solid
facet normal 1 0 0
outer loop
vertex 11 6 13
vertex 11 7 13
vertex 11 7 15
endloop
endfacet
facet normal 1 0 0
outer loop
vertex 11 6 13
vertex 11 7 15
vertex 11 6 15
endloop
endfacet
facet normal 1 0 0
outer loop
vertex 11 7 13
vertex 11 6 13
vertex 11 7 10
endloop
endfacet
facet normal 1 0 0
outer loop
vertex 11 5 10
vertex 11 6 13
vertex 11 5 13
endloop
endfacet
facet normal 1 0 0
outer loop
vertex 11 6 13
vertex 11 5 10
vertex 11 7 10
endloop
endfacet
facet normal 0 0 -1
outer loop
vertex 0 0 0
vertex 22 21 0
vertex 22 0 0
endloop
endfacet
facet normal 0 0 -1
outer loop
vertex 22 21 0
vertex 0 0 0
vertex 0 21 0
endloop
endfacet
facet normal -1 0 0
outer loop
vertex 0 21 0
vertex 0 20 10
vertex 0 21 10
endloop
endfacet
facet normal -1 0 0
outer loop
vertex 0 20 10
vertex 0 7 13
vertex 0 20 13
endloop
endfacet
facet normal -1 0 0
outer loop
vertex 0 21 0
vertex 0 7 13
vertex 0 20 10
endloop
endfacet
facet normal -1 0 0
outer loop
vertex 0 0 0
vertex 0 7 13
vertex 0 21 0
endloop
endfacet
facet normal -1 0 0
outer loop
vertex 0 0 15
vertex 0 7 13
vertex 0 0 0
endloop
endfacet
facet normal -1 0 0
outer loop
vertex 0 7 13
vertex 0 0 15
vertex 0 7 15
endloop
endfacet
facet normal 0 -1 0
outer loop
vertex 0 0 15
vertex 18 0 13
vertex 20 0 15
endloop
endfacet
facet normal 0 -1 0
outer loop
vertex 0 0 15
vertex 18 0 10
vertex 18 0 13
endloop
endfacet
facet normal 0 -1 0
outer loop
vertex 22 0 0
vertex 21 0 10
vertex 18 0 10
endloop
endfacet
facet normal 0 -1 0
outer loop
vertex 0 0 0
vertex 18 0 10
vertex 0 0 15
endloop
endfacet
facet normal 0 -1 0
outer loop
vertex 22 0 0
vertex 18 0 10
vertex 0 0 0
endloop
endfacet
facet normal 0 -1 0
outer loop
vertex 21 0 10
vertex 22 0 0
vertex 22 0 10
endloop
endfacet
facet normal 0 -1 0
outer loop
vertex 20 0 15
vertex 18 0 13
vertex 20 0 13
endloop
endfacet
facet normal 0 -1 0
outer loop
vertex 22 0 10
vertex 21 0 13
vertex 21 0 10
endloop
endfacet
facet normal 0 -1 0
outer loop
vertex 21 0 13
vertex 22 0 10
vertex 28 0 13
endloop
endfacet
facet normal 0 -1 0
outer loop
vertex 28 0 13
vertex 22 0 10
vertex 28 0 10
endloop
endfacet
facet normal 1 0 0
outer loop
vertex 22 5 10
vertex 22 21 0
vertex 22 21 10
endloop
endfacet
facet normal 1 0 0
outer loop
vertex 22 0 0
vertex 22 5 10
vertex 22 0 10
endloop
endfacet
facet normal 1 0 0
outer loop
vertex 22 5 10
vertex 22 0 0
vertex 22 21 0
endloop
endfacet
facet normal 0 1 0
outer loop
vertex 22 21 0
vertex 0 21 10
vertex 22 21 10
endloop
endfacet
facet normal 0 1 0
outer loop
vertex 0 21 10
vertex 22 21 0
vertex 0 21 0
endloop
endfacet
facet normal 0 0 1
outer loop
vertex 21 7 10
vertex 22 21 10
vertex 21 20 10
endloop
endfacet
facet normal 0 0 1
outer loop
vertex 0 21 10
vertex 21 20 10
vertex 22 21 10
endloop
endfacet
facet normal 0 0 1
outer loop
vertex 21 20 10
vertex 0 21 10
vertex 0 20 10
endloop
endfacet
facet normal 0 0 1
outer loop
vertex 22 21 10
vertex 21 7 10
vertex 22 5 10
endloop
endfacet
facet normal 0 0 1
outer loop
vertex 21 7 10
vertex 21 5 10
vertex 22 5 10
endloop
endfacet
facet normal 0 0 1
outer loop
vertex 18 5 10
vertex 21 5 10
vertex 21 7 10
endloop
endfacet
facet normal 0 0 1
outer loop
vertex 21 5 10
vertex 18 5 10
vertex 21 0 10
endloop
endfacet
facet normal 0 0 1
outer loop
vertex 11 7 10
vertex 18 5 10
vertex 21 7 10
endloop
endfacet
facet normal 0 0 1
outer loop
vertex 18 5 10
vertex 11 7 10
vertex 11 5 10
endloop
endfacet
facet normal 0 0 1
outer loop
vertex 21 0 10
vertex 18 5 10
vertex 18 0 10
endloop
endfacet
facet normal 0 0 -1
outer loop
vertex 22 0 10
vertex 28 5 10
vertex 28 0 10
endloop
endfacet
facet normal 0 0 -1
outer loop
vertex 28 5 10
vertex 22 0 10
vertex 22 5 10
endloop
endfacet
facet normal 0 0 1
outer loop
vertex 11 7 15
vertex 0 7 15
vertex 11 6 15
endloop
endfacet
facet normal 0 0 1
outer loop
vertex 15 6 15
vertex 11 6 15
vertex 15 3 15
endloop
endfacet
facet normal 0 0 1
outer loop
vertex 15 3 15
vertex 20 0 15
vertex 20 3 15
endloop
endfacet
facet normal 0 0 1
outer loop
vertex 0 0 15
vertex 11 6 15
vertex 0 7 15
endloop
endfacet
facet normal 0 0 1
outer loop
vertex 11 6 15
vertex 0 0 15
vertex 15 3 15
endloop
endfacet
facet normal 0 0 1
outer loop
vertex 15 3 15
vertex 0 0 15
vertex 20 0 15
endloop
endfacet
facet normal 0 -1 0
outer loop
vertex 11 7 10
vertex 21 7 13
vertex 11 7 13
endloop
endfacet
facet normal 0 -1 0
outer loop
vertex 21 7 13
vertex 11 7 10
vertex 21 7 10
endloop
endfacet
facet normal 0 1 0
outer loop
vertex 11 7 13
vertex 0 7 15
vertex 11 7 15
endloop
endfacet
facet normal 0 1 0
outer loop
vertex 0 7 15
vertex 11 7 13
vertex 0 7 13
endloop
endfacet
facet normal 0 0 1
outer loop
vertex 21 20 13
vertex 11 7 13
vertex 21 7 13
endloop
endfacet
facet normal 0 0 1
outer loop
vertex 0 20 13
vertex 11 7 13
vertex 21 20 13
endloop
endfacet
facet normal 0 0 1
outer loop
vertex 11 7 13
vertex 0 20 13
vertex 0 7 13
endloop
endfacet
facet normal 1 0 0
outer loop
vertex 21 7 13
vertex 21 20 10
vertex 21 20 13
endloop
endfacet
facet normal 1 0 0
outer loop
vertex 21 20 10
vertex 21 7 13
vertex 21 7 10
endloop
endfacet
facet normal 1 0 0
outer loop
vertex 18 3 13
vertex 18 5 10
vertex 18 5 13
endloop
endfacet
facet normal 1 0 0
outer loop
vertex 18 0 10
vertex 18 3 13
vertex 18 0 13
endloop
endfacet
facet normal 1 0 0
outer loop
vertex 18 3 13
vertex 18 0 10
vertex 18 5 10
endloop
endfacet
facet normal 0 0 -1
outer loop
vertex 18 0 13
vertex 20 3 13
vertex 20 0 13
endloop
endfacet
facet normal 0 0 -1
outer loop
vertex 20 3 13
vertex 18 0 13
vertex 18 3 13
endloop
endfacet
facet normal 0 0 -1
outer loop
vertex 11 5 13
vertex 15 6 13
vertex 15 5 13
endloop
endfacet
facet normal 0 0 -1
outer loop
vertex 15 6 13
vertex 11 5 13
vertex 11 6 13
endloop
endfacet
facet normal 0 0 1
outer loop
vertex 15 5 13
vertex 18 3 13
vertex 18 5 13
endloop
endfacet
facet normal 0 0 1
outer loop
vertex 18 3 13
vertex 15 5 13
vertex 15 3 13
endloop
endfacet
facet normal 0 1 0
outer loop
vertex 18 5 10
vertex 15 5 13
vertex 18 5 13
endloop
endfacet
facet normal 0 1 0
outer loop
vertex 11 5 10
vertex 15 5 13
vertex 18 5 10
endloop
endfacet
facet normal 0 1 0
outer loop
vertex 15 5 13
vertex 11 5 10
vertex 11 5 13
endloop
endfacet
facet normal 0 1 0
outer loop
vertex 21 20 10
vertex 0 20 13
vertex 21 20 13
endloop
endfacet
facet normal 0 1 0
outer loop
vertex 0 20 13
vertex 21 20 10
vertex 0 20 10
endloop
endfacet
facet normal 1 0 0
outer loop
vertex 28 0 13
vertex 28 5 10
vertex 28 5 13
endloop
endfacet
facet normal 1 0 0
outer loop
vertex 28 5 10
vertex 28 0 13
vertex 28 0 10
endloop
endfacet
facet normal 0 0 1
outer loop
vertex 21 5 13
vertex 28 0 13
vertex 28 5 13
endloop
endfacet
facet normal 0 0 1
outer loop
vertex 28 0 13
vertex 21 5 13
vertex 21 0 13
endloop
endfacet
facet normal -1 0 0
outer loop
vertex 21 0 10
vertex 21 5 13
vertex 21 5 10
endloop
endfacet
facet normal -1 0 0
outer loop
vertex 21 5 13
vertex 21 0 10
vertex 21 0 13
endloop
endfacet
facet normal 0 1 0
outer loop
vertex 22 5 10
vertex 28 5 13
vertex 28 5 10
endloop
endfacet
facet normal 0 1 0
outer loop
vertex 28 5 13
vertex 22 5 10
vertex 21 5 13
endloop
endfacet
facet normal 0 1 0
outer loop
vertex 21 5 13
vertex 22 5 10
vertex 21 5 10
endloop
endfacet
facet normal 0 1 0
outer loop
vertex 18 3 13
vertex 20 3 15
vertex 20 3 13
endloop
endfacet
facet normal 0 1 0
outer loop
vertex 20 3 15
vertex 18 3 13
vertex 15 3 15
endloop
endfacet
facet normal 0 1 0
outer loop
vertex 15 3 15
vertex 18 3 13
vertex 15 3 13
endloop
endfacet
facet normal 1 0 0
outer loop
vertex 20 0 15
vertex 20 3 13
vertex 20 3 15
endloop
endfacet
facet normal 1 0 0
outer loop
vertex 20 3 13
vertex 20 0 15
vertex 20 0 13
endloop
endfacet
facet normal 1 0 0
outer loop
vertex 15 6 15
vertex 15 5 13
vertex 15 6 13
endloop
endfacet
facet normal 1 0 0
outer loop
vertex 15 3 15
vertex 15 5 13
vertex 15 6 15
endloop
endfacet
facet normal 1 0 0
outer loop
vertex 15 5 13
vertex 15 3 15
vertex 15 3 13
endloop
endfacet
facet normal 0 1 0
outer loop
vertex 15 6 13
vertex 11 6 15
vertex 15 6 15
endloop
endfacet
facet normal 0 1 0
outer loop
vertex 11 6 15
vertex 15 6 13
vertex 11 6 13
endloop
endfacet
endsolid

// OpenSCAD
translate([5.5, 3.5, 2.5]) color([0.48790140560568873, 0.5639041170917963, 0.6383635452384463]) cube([11, 7, 5], center=true);
translate([16.5, 3.5, 2.5]) color([0.42323888002080157, 0.5212286449626529, 0.6793183678168555]) cube([11, 7, 5], center=true);
translate([5.5, 10.5, 2.5]) color([0.8877818831984722, 0.8335334993782705, 0.998183045526196]) cube([11, 7, 5], center=true);
translate([16.5, 10.5, 2.5]) color([0.635064793155105, 0.8746990054994174, 0.5428090736997917]) cube([11, 7, 5], center=true);
translate([5.5, 17.5, 2.5]) color([0.9313134045807503, 0.009704659433814156, 0.7055937347007278]) cube([11, 7, 5], center=true);
translate([16.5, 17.5, 2.5]) color([0.7470388851985934, 0.3182594390073298, 0.32182488616904803]) cube([11, 7, 5], center=true);
translate([5.5, 3.5, 7.5]) color([0.5251073848334467, 0.8744832594460391, 0.6025867148054135]) cube([11, 7, 5], center=true);
translate([16.5, 3.5, 7.5]) color([0.15590536476920036, 0.37900510864666237, 0.2943823465565715]) cube([11, 7, 5], center=true);
translate([5.5, 10.5, 7.5]) color([0.7063732058335496, 0.47043138046830235, 0.799945824478888]) cube([11, 7, 5], center=true);
translate([16.5, 10.5, 7.5]) color([0.5165278007752844, 0.9155142682747232, 0.06635468620874474]) cube([11, 7, 5], center=true);
translate([5.5, 17.5, 7.5]) color([0.13049414784187097, 0.3004482911175872, 0.7588987264331779]) cube([11, 7, 5], center=true);
translate([16.5, 17.5, 7.5]) color([0.4485890964462933, 0.8619033855251227, 0.8006454493762514]) cube([11, 7, 5], center=true);
translate([5.5, 3.5, 12.5]) color([0.8686955098516022, 0.4607350972935428, 0.37132186818867685]) cube([11, 7, 5], center=true);
translate([3.5, 9.5, 11.5]) color([0.38223256097056324, 0.5298076607467874, 0.033618014856222844]) cube([7, 5, 3], center=true);
translate([10.5, 9.5, 11.5]) color([0.09064689039119589, 0.7941451579713075, 0.5179983582932232]) cube([7, 5, 3], center=true);
translate([17.5, 9.5, 11.5]) color([0.6001422851572377, 0.07635810782734587, 0.42636667866841493]) cube([7, 5, 3], center=true);
translate([3.5, 14.5, 11.5]) color([0.7546182662703457, 0.2896641383723638, 0.9011387199060191]) cube([7, 5, 3], center=true);
translate([10.5, 14.5, 11.5]) color([0.4178406508691356, 0.9725485107467589, 0.8454919814395919]) cube([7, 5, 3], center=true);
translate([17.5, 14.5, 11.5]) color([0.9722338049752182, 0.6074299110948179, 0.23357109614697547]) cube([7, 5, 3], center=true);
translate([14.5, 2.5, 11.5]) color([0.8647767439340015, 0.020481785066310598, 0.8852550461906246]) cube([7, 5, 3], center=true);
translate([3.5, 18.5, 11.5]) color([0.7407454042283365, 0.30244204779608386, 0.5702666361217156]) cube([7, 3, 3], center=true);
translate([10.5, 18.5, 11.5]) color([0.3326858137966755, 0.49351002171548763, 0.2620075340788589]) cube([7, 3, 3], center=true);
translate([17.5, 18.5, 11.5]) color([0.8250203378707534, 0.7724801555877414, 0.3841597274693662]) cube([7, 3, 3], center=true);
translate([24.5, 2.5, 11.5]) color([0.3836794276703801, 0.16379542381305134, 0.9355243379423083]) cube([7, 5, 3], center=true);
translate([2.5, 1.5, 14.0]) color([0.23895170008456956, 0.7294506641472926, 0.334024645801835]) cube([5, 3, 2], center=true);
translate([7.5, 1.5, 14.0]) color([0.9418620991403894, 0.4813304127593788, 0.14090487727396894]) cube([5, 3, 2], center=true);
translate([12.5, 1.5, 14.0]) color([0.8899614875266342, 0.6019667067914363, 0.08161964024263468]) cube([5, 3, 2], center=true);
translate([17.5, 1.5, 14.0]) color([0.6986964058233333, 0.8102884962164306, 0.3527718366022422]) cube([5, 3, 2], center=true);
translate([2.5, 4.5, 14.0]) color([0.03517979094215373, 0.4662789582213983, 0.458882332198567]) cube([5, 3, 2], center=true);
translate([7.5, 4.5, 14.0]) color([0.10148050986892876, 0.7781483542276006, 0.02022807324279441]) cube([5, 3, 2], center=true);
translate([12.5, 4.5, 14.0]) color([0.5983002604350479, 0.13270195297871745, 0.3239113547302247]) cube([5, 3, 2], center=true);
